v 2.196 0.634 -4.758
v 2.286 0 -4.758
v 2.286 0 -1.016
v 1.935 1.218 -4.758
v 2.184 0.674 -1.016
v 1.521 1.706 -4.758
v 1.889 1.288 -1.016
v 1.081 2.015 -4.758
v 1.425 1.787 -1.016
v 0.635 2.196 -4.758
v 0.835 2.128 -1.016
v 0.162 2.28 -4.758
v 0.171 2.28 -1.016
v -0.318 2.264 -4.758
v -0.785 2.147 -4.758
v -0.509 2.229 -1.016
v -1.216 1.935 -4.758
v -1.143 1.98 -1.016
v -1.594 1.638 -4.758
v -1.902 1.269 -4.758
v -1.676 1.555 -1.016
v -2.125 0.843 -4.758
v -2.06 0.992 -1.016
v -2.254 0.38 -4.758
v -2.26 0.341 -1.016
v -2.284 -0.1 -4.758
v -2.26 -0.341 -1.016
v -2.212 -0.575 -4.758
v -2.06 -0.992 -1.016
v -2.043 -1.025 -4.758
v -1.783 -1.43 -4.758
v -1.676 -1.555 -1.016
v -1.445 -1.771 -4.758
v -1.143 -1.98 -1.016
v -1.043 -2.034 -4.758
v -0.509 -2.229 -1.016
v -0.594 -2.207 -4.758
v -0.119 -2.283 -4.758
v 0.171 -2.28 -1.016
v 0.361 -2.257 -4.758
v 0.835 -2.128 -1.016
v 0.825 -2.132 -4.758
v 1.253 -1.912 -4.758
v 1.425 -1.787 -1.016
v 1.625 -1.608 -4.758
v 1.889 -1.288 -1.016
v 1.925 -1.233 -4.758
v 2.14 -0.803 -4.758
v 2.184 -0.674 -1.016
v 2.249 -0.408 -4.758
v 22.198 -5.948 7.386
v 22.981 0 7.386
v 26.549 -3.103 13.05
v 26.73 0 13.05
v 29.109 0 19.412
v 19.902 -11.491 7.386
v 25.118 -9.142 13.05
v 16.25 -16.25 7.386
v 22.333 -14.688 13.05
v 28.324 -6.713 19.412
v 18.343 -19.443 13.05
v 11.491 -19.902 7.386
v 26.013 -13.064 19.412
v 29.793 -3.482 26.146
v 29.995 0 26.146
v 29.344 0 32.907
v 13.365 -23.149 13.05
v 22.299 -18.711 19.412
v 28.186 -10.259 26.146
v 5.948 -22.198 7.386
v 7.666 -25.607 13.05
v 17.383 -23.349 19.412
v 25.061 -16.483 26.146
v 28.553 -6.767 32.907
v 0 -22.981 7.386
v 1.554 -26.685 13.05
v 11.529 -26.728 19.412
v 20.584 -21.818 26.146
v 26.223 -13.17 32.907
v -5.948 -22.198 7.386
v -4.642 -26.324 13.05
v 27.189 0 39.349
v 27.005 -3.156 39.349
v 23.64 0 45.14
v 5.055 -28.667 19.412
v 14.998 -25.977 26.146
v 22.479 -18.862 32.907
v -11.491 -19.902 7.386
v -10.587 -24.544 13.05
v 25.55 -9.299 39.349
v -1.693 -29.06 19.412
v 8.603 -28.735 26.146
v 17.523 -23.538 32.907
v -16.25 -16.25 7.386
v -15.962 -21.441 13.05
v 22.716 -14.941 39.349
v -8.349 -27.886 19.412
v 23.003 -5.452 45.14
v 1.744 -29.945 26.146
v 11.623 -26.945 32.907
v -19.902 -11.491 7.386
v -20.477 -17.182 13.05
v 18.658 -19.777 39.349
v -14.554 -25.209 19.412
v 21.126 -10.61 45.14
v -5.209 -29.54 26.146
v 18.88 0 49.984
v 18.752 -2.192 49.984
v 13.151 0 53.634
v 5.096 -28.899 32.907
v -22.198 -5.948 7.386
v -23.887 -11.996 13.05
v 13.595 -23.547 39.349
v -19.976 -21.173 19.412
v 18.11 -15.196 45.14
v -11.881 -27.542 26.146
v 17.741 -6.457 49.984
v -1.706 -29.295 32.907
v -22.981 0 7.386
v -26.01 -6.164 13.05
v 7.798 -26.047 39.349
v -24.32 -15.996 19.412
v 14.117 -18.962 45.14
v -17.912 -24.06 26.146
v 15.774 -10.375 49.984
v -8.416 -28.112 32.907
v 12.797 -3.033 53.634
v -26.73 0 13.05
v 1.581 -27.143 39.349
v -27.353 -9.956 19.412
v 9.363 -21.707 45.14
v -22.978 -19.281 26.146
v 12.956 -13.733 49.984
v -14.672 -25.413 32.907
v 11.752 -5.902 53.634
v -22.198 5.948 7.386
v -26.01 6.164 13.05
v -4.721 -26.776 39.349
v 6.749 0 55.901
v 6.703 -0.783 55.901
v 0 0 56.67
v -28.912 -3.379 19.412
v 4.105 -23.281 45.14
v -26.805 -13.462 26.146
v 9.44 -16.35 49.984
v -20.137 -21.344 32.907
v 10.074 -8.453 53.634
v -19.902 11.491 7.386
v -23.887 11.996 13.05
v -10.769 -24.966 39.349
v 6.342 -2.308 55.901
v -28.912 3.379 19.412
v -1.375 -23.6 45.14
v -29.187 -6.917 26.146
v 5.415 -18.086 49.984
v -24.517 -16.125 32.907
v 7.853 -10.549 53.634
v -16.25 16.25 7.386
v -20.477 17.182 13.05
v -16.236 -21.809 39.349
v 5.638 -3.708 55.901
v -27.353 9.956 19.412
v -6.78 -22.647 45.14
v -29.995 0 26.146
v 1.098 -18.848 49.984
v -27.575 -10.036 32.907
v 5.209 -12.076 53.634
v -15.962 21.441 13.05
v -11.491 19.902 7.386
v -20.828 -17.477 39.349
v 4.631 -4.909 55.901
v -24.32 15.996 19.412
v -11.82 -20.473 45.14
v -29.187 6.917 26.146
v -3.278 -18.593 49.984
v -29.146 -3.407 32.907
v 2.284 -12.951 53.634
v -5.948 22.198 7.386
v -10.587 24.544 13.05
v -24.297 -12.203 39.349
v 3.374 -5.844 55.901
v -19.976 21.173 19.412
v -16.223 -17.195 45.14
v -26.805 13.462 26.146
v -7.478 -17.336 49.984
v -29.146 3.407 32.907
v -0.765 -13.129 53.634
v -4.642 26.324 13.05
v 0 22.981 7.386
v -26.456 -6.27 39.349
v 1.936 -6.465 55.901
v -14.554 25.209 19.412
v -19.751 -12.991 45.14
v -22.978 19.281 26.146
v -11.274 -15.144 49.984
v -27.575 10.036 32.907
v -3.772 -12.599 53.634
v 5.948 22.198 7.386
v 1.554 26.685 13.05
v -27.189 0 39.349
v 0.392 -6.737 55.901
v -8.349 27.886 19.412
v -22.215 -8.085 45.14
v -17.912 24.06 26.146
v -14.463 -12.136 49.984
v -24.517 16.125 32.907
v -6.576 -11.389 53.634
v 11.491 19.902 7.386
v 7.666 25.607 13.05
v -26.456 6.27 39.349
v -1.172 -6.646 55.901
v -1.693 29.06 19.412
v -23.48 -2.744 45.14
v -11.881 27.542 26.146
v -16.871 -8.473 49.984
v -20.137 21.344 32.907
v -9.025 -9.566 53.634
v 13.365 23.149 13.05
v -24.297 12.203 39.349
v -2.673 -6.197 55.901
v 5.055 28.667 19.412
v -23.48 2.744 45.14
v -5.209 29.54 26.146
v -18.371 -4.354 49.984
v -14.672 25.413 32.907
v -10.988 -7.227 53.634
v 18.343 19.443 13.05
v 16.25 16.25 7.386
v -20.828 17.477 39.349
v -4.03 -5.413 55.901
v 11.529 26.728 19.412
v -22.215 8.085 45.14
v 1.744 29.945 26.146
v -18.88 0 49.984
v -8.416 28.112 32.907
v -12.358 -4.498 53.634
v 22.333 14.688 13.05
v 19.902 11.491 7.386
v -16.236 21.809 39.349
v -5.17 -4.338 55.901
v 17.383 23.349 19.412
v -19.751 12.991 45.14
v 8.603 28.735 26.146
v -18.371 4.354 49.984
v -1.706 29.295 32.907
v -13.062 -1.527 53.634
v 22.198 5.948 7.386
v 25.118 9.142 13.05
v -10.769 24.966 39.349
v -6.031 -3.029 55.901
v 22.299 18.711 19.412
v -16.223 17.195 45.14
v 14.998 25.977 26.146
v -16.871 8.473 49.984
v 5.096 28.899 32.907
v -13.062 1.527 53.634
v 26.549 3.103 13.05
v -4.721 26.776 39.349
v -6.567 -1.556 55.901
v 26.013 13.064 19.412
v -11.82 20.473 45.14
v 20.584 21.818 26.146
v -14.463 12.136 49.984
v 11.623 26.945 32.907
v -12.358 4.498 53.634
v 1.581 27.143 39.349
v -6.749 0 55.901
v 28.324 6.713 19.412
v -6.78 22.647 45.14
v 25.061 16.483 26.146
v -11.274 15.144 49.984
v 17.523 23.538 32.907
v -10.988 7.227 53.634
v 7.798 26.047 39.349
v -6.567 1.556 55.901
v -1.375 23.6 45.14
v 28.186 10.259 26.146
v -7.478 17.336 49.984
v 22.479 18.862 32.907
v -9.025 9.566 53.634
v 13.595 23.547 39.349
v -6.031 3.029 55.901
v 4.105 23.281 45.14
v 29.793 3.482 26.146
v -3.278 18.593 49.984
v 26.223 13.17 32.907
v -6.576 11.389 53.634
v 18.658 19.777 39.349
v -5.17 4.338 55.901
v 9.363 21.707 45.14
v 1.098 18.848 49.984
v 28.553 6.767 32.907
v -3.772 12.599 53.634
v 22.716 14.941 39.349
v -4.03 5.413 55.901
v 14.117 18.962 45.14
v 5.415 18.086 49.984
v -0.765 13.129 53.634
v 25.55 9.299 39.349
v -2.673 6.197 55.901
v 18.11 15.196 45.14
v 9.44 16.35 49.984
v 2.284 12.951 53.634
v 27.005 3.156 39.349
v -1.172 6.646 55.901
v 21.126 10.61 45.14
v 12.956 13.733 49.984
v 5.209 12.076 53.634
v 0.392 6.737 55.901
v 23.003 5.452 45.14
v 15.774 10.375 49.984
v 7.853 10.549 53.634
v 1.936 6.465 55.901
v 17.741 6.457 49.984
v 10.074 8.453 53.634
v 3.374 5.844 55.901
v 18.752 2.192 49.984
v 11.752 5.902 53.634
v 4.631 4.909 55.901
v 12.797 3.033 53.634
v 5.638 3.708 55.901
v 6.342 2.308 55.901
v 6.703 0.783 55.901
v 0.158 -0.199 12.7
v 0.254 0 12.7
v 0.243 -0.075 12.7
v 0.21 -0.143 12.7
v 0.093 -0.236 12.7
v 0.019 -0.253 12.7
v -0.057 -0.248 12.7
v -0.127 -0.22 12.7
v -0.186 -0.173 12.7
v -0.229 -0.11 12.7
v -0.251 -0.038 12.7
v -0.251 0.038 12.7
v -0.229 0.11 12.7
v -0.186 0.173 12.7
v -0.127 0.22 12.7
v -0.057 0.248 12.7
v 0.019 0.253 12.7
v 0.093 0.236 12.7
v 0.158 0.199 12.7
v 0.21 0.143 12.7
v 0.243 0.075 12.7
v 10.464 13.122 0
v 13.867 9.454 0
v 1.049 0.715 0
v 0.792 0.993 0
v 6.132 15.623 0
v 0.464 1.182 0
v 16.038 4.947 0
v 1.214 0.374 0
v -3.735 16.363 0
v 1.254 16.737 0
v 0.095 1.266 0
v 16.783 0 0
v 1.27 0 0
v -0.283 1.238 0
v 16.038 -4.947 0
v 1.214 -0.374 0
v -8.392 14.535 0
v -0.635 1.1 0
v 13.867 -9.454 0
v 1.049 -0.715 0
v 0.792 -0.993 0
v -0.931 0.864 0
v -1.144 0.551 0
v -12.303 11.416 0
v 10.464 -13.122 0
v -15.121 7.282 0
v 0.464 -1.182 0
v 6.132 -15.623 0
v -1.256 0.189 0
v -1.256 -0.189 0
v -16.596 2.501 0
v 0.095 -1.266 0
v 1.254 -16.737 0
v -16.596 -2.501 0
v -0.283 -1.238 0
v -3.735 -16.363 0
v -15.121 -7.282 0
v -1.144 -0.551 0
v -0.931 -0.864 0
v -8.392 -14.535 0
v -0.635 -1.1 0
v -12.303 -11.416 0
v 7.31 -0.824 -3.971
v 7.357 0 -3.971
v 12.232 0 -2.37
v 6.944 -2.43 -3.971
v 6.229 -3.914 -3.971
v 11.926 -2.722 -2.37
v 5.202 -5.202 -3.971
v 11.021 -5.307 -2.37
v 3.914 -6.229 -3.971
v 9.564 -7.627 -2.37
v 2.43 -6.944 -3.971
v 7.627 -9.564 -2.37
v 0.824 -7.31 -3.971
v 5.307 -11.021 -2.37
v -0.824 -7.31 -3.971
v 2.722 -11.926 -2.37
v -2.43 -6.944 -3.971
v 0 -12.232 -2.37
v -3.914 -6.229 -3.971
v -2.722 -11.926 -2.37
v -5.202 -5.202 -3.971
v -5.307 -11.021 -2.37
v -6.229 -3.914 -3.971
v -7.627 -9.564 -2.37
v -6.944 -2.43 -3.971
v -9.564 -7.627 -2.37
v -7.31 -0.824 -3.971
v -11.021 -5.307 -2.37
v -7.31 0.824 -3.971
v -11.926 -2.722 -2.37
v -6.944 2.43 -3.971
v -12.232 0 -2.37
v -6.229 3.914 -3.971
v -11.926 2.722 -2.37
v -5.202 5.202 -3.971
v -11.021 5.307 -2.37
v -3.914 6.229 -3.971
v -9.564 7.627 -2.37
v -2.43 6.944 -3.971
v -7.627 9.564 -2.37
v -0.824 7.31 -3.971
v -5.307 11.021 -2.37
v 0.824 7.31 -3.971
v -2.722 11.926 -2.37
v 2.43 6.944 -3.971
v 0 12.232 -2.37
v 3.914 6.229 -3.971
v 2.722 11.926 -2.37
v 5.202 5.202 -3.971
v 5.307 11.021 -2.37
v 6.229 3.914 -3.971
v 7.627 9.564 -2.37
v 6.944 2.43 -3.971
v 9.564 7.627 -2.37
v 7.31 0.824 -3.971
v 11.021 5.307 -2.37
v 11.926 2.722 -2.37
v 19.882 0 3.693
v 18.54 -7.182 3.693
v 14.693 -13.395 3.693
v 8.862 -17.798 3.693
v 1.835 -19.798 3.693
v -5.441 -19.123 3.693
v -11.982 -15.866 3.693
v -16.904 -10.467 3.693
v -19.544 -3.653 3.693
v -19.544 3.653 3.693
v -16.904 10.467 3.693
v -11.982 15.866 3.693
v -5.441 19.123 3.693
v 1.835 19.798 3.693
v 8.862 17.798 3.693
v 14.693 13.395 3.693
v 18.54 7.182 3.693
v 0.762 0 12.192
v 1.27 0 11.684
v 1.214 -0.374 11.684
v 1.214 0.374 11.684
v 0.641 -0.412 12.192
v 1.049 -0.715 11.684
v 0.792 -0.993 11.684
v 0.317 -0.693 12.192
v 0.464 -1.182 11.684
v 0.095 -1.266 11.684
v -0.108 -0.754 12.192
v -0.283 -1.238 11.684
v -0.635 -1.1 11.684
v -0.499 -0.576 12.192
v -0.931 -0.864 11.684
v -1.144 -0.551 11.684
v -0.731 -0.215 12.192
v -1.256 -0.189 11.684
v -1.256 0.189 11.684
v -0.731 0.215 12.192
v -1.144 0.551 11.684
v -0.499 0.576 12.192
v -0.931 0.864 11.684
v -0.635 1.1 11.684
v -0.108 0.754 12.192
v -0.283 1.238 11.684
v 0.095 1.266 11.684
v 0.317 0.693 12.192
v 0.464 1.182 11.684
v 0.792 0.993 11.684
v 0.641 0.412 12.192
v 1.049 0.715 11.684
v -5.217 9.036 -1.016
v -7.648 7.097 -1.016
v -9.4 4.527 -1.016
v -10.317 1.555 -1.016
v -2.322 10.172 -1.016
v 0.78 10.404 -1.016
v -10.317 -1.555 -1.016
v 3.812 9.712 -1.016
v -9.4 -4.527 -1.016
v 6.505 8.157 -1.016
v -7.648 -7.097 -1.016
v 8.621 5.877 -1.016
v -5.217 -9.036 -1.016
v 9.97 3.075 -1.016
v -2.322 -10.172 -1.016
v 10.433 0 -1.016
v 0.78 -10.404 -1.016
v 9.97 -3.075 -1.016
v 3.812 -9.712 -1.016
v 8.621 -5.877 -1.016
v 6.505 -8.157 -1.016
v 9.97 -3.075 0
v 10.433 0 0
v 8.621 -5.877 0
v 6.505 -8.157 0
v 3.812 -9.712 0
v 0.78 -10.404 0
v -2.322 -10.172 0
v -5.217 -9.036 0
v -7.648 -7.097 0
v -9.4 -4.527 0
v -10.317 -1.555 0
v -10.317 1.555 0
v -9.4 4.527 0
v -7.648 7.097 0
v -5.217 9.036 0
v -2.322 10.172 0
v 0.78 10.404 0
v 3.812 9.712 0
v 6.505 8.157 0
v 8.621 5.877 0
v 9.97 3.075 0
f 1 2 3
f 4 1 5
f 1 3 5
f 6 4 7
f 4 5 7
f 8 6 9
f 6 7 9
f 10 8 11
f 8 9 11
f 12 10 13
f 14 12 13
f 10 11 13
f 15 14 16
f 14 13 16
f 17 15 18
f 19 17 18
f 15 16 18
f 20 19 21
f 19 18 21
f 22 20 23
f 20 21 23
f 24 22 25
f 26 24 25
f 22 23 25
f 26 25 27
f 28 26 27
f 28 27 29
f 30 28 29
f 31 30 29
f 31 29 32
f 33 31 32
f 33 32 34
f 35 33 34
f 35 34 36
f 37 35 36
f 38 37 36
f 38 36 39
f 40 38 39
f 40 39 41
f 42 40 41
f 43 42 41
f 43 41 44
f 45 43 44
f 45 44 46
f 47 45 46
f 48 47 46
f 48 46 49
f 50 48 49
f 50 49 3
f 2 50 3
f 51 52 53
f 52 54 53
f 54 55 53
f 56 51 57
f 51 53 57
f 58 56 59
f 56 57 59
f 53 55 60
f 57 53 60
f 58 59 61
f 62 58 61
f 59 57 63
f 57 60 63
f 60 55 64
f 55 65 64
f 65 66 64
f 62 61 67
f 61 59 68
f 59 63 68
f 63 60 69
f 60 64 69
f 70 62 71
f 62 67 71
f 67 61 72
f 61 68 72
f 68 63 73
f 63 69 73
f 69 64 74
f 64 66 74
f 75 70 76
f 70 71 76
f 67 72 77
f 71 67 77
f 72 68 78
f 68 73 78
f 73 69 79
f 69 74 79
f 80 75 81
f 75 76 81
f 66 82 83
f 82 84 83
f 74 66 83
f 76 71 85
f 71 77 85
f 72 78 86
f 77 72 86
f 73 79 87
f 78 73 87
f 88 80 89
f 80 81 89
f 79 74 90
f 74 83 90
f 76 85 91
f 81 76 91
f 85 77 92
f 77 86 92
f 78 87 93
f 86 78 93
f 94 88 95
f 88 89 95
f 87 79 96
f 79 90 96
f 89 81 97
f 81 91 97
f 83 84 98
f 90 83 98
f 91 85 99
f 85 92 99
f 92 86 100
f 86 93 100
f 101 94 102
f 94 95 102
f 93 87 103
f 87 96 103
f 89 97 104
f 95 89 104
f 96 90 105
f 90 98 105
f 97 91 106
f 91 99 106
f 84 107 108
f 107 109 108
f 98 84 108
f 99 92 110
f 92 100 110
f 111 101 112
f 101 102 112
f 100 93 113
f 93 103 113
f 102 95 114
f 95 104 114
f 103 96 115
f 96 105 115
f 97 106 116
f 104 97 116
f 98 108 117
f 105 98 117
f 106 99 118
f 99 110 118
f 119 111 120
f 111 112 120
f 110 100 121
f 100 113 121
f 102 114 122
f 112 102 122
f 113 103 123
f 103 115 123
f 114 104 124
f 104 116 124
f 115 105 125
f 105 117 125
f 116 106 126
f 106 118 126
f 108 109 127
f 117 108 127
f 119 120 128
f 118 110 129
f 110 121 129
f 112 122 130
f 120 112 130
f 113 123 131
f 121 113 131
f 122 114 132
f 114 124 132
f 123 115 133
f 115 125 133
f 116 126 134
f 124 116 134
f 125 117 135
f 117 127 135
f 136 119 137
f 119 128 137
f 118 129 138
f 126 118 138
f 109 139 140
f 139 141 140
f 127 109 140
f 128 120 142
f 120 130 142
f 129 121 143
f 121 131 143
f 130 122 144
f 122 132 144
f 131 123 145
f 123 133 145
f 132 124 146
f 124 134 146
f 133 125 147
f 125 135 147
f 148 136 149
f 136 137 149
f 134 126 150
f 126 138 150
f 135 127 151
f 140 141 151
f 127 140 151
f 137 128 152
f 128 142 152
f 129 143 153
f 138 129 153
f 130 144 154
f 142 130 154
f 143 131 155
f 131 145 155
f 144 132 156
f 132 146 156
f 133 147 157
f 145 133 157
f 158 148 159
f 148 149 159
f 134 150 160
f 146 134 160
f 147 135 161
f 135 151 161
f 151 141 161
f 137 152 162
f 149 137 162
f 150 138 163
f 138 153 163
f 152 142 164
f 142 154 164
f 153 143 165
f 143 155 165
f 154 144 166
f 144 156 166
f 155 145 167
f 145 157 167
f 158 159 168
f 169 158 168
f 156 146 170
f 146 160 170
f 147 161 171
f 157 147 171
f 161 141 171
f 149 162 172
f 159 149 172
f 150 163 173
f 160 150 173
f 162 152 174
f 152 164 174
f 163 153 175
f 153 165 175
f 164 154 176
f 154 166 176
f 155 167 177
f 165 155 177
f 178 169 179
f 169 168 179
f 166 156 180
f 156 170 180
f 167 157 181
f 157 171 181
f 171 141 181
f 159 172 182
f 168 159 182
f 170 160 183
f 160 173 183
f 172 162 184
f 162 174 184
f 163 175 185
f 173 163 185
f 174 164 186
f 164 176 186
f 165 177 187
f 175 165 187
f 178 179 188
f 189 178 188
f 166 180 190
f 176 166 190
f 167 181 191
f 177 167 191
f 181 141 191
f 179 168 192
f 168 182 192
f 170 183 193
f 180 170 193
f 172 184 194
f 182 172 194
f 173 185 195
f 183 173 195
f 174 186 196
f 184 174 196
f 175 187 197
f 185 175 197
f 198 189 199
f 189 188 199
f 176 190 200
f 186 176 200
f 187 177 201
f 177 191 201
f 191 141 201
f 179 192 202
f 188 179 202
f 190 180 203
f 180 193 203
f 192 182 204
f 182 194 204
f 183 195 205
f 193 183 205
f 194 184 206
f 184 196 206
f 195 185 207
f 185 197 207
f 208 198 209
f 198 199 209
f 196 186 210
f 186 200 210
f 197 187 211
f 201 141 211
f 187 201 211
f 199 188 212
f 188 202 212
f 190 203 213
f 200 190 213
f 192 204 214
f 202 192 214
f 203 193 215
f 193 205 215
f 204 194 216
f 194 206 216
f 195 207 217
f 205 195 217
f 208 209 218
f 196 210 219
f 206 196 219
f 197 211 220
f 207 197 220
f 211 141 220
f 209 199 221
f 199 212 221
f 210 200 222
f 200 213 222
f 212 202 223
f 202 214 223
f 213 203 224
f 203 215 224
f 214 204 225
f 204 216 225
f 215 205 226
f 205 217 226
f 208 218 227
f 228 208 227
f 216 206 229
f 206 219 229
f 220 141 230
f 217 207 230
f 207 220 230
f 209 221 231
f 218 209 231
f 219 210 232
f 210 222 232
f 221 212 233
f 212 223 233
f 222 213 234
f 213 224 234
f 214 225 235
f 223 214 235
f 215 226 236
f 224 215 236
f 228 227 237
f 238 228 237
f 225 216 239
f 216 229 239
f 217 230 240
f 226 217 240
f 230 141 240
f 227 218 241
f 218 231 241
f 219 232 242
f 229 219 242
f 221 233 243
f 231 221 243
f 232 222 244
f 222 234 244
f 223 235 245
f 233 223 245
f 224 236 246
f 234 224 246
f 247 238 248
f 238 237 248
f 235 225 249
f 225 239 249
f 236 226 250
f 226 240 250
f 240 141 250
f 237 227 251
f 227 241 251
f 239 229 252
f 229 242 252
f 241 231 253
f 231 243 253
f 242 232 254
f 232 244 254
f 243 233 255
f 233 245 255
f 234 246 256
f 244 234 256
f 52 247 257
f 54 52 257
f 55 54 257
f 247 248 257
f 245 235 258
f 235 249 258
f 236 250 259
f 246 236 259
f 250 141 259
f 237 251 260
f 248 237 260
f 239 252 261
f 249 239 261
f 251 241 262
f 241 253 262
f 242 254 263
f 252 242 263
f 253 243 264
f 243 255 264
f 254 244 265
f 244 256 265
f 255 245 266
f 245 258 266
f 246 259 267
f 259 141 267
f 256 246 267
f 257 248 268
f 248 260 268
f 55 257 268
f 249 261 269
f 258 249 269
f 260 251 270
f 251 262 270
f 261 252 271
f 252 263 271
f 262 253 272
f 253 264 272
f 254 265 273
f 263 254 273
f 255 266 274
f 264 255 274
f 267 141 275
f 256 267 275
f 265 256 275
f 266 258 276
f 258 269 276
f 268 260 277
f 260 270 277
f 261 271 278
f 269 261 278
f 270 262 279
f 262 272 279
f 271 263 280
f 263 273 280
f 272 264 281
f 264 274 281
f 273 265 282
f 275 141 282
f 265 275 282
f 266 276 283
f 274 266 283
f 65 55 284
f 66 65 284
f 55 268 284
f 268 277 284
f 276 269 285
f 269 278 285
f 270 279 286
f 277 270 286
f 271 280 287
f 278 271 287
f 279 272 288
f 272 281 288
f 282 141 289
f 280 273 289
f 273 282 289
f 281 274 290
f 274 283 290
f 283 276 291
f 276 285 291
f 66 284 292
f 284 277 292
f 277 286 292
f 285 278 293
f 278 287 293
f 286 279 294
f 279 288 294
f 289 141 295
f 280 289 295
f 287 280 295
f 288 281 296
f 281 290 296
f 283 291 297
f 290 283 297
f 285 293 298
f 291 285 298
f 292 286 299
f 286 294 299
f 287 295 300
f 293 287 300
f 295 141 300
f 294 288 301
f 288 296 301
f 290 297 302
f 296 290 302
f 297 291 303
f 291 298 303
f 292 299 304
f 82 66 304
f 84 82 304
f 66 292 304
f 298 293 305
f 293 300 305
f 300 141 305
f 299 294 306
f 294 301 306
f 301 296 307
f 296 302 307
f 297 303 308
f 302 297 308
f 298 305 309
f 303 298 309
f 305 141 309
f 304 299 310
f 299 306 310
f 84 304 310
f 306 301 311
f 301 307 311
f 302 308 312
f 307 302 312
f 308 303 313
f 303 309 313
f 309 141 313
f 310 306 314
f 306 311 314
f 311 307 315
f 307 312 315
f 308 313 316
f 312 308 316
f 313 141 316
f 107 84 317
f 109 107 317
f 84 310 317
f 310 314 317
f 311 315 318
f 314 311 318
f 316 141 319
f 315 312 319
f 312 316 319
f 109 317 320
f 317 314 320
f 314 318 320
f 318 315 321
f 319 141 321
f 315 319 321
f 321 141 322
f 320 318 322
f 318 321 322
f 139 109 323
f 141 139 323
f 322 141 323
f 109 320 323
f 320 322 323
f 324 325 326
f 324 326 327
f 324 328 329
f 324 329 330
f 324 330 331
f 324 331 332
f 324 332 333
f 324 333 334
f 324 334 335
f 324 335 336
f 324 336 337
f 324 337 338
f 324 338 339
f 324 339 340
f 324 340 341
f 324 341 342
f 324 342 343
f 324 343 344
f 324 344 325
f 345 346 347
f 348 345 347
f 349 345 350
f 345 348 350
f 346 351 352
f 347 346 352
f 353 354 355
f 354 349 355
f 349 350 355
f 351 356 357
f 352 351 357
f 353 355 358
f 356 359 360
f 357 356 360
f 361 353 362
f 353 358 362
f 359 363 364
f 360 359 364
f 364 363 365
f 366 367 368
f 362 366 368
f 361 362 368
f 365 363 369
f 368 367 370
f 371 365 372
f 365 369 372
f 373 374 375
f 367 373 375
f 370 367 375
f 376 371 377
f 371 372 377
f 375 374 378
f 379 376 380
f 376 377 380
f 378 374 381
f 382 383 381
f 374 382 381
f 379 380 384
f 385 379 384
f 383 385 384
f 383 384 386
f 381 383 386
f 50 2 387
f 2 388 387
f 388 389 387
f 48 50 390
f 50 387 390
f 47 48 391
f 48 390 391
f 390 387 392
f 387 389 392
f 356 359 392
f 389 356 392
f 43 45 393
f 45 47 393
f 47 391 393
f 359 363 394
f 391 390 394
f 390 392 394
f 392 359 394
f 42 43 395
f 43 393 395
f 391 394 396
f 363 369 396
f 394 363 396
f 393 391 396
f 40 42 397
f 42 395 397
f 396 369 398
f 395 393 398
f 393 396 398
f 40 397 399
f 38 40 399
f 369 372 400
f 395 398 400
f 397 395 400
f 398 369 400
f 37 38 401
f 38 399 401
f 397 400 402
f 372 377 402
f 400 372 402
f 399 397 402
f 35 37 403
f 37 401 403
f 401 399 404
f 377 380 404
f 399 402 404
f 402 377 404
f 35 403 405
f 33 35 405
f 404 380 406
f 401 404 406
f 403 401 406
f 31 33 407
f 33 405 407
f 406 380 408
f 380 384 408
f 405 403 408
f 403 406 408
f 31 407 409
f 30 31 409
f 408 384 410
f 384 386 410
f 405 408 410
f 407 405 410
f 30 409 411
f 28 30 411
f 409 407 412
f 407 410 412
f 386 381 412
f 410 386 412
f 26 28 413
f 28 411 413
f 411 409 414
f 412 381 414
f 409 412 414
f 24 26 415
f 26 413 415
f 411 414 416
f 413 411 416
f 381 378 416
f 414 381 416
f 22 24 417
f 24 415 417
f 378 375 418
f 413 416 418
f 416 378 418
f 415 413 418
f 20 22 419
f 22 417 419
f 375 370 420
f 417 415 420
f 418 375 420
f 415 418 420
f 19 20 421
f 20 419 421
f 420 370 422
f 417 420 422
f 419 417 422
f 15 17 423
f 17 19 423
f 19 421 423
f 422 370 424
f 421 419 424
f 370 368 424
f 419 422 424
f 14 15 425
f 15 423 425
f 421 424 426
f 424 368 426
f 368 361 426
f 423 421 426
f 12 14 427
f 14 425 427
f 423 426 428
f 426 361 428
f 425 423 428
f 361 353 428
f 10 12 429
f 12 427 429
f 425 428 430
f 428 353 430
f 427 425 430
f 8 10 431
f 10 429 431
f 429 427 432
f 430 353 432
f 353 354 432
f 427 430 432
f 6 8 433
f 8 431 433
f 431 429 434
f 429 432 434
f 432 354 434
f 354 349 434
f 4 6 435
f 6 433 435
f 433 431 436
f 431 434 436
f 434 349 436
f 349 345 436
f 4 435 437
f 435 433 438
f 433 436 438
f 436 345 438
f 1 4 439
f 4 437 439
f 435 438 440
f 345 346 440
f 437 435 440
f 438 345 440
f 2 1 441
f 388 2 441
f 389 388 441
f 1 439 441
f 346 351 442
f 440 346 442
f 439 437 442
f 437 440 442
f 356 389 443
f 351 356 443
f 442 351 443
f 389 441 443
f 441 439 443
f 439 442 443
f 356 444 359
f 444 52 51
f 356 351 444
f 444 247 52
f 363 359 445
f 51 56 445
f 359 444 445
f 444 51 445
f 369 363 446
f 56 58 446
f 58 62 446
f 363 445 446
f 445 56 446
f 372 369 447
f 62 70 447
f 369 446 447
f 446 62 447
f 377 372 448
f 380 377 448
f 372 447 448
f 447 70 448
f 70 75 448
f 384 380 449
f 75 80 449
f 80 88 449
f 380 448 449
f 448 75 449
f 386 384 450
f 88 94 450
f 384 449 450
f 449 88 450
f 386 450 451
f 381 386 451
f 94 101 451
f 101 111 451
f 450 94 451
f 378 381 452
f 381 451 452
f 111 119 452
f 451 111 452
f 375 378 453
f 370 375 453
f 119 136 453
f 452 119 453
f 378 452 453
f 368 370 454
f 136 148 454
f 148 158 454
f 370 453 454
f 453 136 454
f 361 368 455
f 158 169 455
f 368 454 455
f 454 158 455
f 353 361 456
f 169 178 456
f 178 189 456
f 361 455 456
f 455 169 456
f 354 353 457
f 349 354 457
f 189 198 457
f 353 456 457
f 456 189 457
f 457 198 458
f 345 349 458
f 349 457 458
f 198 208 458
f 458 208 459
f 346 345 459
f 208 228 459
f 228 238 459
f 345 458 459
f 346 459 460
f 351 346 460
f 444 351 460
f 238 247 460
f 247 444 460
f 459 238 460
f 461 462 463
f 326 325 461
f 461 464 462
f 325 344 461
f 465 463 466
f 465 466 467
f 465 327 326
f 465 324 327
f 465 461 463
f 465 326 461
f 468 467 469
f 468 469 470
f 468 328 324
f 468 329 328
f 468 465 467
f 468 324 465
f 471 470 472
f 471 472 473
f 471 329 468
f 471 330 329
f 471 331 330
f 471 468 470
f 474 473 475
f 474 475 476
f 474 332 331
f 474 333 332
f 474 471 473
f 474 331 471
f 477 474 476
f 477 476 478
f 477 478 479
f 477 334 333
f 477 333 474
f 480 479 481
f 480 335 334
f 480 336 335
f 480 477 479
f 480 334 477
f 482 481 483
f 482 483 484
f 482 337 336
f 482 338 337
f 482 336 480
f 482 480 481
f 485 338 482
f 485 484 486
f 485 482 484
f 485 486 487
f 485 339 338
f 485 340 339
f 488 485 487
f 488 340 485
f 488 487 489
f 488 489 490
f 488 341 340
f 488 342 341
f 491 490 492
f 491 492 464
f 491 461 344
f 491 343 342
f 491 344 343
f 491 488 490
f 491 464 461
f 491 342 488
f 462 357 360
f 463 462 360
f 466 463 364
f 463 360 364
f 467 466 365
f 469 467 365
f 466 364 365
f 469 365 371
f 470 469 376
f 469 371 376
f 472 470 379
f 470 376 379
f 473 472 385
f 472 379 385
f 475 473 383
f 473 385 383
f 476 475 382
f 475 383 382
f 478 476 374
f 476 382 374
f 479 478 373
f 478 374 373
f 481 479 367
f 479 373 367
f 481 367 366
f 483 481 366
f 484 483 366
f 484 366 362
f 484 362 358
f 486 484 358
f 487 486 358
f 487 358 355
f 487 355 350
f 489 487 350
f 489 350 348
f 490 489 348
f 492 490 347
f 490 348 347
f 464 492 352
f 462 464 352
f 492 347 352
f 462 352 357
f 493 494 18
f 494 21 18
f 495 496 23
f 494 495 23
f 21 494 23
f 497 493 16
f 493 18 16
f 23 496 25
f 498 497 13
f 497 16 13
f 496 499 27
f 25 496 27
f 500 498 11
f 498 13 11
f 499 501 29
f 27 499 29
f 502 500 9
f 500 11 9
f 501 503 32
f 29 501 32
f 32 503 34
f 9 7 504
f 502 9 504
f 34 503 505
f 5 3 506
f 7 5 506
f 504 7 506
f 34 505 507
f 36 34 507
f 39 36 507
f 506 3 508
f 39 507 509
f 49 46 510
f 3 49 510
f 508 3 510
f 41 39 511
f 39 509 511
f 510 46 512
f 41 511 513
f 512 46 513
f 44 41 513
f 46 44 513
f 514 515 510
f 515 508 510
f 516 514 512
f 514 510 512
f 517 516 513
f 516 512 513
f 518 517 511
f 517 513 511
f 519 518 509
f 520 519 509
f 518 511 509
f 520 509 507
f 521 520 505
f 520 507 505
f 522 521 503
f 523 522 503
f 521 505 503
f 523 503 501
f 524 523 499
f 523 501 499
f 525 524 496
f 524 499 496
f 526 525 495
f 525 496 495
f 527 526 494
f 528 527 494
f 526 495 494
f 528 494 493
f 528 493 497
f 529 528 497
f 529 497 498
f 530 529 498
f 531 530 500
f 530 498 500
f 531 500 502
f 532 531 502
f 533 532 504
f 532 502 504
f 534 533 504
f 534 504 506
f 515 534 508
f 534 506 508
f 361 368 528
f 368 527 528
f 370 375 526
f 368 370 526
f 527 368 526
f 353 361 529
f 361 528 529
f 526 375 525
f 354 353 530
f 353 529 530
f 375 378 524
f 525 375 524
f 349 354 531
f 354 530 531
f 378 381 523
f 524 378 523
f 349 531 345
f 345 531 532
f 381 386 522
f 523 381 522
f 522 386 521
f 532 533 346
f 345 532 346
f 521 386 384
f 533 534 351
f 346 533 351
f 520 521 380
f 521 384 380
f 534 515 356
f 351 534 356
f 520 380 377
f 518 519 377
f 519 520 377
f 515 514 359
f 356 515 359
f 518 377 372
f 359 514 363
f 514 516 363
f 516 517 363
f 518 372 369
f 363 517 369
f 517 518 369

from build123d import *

# Parameters (mm, degrees)
F2_R     = 1.27
F3_DEPTH = 12.7
F4_SIZE  = 1.016
F7_R     = 2.286
F8_DEPTH = 25.4


# Not quite as in the source:
# - a feature names something its author has since deleted; it is built from what else it names


with BuildPart() as f1:
    # F0 (on Front) → F1 (revolve)
    with BuildSketch(Plane.XZ):
        with BuildLine():
            Line((16.7834315165, 0), (22.9813332936, 7.3863717094))
            ThreePointArc((22.9813332936, 7.3863717094), (27.1892336111, 39.3485478522), (0, 56.67))
            Line((0, 56.67), (0, 0))
            Line((0, 0), (16.7834315165, 0))
        make_face()
    revolve(axis=Axis((0, 0, -28.7515761617), (0, 0, -1)))

    # F2 (on face) → F3 (cut)
    with BuildSketch(Plane(origin=(0, 0, 0), x_dir=(1, 0, 0), z_dir=(0, 0, -1))):
        Circle(F2_R)
    extrude(amount=-F3_DEPTH, mode=Mode.SUBTRACT)

    # F4
    f4_edges = [f1.edges().sort_by_distance(p)[0] for p in [
        (-1.27, 0, 12.7),
    ]]
    chamfer(f4_edges, length=F4_SIZE)


with BuildPart() as f6:
    # F5 (on Front) → F6 (revolve)
    with BuildSketch(Plane.XZ):
        with BuildLine():
            Line((0, -1.016), (0, -4.8414657461))
            ThreePointArc((0, -4.8414657461), (8.7338903708, -3.6069158346), (16.7834315165, 0))
            Line((16.7834315165, 0), (10.4334315165, 0))
            Line((10.4334315165, 0), (10.4334315165, -1.016))
            Line((10.4334315165, -1.016), (0, -1.016))
        make_face()
    revolve(axis=Axis((0, 0, -28.7515761617), (0, 0, -1)))

    # F7 (on face) → F8 (cut)
    with BuildSketch(Plane.XY.offset(-1.016)):
        Circle(F7_R)
    extrude(amount=-F8_DEPTH, mode=Mode.SUBTRACT)


solid = Compound([f1.part, f6.part])
